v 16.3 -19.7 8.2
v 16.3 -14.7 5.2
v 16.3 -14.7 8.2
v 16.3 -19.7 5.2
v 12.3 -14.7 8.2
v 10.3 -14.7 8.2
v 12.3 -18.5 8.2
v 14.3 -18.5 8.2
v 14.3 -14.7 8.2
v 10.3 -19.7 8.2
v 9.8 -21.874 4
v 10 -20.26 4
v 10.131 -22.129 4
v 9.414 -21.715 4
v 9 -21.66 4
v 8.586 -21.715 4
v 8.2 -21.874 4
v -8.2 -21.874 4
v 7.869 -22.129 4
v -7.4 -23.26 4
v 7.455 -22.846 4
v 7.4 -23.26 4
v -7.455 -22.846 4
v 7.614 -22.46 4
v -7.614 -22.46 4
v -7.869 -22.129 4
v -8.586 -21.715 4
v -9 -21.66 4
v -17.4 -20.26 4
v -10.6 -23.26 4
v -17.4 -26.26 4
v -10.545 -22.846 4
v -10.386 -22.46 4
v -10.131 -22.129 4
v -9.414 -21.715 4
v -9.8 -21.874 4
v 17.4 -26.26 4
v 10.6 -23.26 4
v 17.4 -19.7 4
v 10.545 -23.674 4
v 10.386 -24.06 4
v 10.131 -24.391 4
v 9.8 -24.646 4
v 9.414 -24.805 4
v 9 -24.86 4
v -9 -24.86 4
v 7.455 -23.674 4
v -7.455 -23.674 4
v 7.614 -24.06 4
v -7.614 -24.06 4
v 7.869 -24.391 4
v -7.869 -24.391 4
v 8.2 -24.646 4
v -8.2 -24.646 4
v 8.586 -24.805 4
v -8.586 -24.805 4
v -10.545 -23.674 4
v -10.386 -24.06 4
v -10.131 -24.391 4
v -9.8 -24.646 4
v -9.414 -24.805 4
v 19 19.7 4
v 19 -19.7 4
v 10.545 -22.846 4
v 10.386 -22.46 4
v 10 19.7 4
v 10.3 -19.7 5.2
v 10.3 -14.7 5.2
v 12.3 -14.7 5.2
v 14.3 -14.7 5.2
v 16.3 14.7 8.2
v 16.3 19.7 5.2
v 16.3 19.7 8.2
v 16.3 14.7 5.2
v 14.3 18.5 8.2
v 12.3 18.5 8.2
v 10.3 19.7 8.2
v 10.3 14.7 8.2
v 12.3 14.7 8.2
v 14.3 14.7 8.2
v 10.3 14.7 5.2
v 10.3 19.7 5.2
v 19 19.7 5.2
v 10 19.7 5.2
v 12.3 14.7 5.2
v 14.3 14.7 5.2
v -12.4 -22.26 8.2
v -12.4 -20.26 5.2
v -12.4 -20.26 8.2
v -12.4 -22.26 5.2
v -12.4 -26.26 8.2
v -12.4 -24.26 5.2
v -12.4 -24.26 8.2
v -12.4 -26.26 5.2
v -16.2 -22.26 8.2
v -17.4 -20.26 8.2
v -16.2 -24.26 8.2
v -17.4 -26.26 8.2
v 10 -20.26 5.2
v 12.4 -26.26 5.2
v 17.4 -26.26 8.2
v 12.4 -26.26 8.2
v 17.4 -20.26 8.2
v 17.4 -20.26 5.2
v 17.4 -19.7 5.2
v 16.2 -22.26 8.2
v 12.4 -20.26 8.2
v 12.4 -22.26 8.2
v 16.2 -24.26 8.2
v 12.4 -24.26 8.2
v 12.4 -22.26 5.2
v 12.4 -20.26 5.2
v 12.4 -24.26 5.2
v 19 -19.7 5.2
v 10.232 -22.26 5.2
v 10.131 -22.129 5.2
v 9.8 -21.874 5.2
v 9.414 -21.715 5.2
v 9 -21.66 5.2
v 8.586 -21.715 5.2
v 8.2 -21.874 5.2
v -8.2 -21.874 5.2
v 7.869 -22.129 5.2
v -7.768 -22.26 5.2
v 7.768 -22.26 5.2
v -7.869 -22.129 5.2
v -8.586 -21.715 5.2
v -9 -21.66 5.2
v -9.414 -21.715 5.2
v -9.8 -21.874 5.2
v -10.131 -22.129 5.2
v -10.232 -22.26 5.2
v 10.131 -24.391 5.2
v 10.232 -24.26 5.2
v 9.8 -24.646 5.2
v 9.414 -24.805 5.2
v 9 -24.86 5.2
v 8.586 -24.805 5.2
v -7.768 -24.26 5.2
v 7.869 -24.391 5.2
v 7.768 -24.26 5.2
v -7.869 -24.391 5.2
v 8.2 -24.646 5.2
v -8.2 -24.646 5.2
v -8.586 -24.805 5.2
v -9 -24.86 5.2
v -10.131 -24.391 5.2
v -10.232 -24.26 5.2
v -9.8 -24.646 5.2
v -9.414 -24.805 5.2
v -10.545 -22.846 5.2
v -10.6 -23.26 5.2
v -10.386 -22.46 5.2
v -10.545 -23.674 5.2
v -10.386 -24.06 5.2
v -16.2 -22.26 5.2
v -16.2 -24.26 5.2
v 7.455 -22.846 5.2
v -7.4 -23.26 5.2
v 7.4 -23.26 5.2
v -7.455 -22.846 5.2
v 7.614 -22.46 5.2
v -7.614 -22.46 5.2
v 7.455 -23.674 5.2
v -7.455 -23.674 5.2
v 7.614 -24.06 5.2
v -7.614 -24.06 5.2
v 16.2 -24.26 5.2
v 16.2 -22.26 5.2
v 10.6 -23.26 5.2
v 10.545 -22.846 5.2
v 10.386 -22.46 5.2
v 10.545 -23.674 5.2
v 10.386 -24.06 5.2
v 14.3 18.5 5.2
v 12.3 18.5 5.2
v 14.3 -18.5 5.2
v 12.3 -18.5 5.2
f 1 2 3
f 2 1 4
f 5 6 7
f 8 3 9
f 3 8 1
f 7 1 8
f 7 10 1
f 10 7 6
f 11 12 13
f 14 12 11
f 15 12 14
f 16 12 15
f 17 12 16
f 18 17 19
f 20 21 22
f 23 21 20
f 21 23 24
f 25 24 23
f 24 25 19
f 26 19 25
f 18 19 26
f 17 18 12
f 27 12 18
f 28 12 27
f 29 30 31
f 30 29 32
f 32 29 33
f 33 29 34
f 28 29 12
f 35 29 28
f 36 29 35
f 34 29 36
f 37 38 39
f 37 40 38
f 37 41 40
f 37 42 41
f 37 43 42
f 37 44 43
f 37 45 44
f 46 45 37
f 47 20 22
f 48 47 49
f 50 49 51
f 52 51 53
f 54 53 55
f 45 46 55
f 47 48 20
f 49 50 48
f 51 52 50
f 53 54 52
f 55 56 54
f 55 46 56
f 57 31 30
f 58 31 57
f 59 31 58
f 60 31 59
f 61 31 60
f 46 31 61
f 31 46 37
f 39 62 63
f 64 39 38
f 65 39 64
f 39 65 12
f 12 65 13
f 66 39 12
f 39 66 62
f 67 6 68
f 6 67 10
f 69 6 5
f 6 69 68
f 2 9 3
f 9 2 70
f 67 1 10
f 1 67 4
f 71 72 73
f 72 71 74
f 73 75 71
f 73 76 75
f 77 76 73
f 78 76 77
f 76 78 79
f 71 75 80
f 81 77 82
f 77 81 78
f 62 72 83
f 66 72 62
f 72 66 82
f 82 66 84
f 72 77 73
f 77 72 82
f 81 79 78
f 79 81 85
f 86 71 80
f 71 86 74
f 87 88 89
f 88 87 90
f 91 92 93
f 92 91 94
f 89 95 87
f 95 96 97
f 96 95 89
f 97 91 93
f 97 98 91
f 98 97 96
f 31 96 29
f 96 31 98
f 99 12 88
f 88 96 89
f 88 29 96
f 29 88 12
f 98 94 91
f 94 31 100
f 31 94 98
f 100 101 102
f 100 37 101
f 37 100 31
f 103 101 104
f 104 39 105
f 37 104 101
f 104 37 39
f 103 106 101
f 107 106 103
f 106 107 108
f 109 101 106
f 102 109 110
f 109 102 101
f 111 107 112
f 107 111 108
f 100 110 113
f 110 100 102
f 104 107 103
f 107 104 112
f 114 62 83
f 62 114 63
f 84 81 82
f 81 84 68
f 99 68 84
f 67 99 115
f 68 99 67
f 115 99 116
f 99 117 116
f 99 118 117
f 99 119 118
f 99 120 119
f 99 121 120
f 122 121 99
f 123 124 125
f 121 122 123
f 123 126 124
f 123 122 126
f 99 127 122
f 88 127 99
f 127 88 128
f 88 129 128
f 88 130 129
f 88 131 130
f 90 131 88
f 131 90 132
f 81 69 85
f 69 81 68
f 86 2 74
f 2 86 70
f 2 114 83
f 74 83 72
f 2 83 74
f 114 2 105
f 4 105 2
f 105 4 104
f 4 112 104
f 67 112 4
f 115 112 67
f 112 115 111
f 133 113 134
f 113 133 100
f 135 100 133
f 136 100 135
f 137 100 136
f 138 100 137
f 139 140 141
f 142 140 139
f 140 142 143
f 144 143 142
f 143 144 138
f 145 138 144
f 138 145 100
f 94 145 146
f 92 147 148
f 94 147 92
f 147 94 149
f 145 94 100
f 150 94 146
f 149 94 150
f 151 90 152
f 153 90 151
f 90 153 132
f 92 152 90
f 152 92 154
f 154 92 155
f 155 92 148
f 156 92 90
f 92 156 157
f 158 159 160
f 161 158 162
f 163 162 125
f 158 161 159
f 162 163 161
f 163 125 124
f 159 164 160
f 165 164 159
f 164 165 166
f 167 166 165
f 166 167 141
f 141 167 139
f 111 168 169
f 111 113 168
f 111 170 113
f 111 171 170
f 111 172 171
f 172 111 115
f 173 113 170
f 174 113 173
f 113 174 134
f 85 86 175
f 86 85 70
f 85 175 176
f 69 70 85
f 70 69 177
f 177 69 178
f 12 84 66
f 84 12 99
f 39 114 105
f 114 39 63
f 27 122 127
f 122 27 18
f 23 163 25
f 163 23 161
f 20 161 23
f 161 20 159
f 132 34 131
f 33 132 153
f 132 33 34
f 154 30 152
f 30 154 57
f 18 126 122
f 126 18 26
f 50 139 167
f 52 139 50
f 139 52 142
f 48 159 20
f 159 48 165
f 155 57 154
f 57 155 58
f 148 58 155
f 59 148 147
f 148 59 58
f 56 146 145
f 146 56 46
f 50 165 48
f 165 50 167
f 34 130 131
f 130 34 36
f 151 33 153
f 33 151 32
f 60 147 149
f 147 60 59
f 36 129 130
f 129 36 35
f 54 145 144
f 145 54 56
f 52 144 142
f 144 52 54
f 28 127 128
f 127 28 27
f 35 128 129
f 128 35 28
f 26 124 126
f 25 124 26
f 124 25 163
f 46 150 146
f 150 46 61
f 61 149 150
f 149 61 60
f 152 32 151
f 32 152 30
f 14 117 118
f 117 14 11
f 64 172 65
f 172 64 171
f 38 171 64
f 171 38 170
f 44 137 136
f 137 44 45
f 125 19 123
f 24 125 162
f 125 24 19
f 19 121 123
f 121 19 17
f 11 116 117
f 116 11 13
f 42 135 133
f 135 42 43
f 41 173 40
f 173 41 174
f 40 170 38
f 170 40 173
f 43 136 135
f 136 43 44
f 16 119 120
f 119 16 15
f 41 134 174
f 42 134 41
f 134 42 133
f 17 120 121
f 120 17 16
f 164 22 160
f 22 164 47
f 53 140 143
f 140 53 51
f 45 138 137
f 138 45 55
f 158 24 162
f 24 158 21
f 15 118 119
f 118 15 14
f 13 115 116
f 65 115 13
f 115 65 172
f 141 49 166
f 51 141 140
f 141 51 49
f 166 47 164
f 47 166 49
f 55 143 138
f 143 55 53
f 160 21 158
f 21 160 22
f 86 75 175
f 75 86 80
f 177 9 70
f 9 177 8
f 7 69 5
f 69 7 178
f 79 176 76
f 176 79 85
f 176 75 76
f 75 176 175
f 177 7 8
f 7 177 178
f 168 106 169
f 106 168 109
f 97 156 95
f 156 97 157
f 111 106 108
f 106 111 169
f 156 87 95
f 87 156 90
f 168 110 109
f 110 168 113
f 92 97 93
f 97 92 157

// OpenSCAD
// file: electronics_envelopes.scad
// Space claims for the parts that are bought, not printed, in the tall-box frame.
// Used for fit checks and renders only. ASSUMED sizes are marked.
floor_z  = 4.0;
seat_z   = floor_z + 1.2;          // board bottom edge, = sled_t above the floor

// ULN2003 module, the common 35 x 32 board (ASSUMED, not measured).
// Stands on its 35 mm edge in the plane x = drv_x, chip side facing +X.
drv_l = 35; drv_h = 32; pcb = 1.6;
drv_slot = drv_l + 2.0;            // +-1 mm play on length
drv_x    = 13.3;
drv_front = 8.5;                   // chip, LEDs, JST socket
drv_back  = 2.0;                   // solder joints
bare_edge = 3.0;                   // bottom strip held by the grooves

// 7Semi MCP23017 breakout BO-10180: 31 x 20, 7.14 tall with the JST (published).
// Stands on its 31 mm edge in the plane y = mcp_y, parts facing -Y (to the wall).
mcp_l = 31; mcp_h = 20;
mcp_slot = mcp_l + 1.4;
mcp_y    = -23.26;
mcp_front = 7.14 - pcb;
mcp_back  = 2.0;

module driver_env() {
    translate([drv_x - pcb / 2, -drv_l / 2, seat_z]) cube([pcb, drv_l, drv_h]);
    translate([drv_x - pcb / 2 - drv_back, -drv_l / 2, seat_z + bare_edge]) cube([drv_back, drv_l, drv_h - bare_edge]);
    translate([drv_x + pcb / 2, -drv_l / 2 + 2, seat_z + 5]) cube([drv_front, drv_l - 4, drv_h - 5]);
    // motor plug in the JST, top middle, sticking out +X
    translate([drv_x + pcb / 2, -6, seat_z + drv_h - 11]) cube([14, 12, 9]);
}

module mcp_env() {
    translate([-mcp_l / 2, mcp_y - pcb / 2, seat_z]) cube([mcp_l, pcb, mcp_h]);
    translate([-mcp_l / 2 + 2, mcp_y - pcb / 2 - mcp_front, seat_z + bare_edge]) cube([mcp_l - 4, mcp_front, mcp_h - bare_edge]);
    translate([-mcp_l / 2 + 2, mcp_y + pcb / 2, seat_z + bare_edge]) cube([mcp_l - 4, mcp_back, mcp_h - bare_edge]);
}

// 28BYJ-48 in the tall-box frame (MEASURED sizes from motor_spec.scad)
module motor_env() {
    translate([-7.5, 0, 15.5]) cylinder(d = 28.1, h = 19, $fn = 100);
    translate([0, 0, 34.5]) cylinder(d = 9, h = 2, $fn = 60);
    translate([0, 0, 36.5]) intersection() { cylinder(d = 5, h = 7.5, $fn = 40); translate([-3, -1.5, 0]) cube([6, 3, 7.5]); }   // 3 mm flats, along Y like the cam bore
    for (y = [-17.35, 17.35]) translate([-7.5, y, 33.5]) cylinder(d = 7, h = 1, $fn = 40);
    hull() for (y = [-17.35, 17.35]) translate([-7.5, y, 33.5]) cylinder(d = 7, h = 1, $fn = 40);
    translate([-25, -8, 15.5]) cube([5, 16, 8]);
}
// main file
// Electronics sled: a separate part that holds the ULN2003 module and the
// 7Semi MCP23017 breakout on edge. It drops onto the box floor, two pegs locate
// it, and a dab of hot glue keeps it there. The pegs stand on the box floor,
// so this part prints flat with no supports. If a board does not fit, reprint
// this part only.
//
// Each board stands on its bottom edge in two short end grooves. The grooves
// touch only the corner mounting-hole areas, because the long edges of both
// boards carry the solder pads.
include <electronics_envelopes.scad>

sled_t      = 1.2;     // base plate under every groove
groove_w    = 2.0;     // PCB 1.6
groove_d    = 3.0;
bracket_len = 5.0;
wall        = 2.0;
peg_d       = 2.8;
peg_h       = 1.1;     // below the MCP edge at seat_z
sled_pegs   = [[-9, mcp_y], [9, mcp_y]];   // under the MCP strip, clear of the floor gutters

module bracket(x0, y0, sx, sy) translate([x0, y0, floor_z]) cube([sx, sy, sled_t + groove_d]);

module electronics_sled() {
    difference() {
        union() {
            // driver strip; wide enough to bridge the floor gutter at x 11..18
            translate([10.0, -drv_slot / 2 - 1.2, floor_z]) cube([9.0, drv_slot + 2.4, sled_t]);
            for (s = [-1, 1])
                bracket(drv_x - groove_w / 2 - wall, s > 0 ? drv_slot / 2 + 1.2 - bracket_len : -drv_slot / 2 - 1.2,
                        groove_w + 2 * wall, bracket_len);
            // MCP strip
            translate([-mcp_slot / 2 - 1.2, mcp_y - groove_w / 2 - wall, floor_z])
                cube([mcp_slot + 2.4, groove_w + 2 * wall, sled_t]);
            for (s = [-1, 1])
                bracket(s > 0 ? mcp_slot / 2 + 1.2 - bracket_len : -mcp_slot / 2 - 1.2, mcp_y - groove_w / 2 - wall,
                        bracket_len, groove_w + 2 * wall);
            // tie between the two strips
            translate([10.0, mcp_y, floor_z]) cube([mcp_slot / 2 + 1.2 - 10.0, -drv_slot / 2 - mcp_y, sled_t]);
        }
        for (p = sled_pegs) translate([p[0], p[1], floor_z - 0.1]) cylinder(d = peg_d + 0.4, h = sled_t + 0.2, $fn = 24);
        translate([drv_x - groove_w / 2, -drv_slot / 2, seat_z]) cube([groove_w, drv_slot, groove_d + 1]);
        translate([-mcp_slot / 2, mcp_y - groove_w / 2, seat_z]) cube([mcp_slot, groove_w, groove_d + 1]);
    }
}

// pegs on the box floor, added by outer_box.scad
module sled_floor_pegs() for (p = sled_pegs) translate([p[0], p[1], floor_z - 0.2]) cylinder(d = peg_d, h = peg_h + 0.2, $fn = 24);

electronics_sled();
